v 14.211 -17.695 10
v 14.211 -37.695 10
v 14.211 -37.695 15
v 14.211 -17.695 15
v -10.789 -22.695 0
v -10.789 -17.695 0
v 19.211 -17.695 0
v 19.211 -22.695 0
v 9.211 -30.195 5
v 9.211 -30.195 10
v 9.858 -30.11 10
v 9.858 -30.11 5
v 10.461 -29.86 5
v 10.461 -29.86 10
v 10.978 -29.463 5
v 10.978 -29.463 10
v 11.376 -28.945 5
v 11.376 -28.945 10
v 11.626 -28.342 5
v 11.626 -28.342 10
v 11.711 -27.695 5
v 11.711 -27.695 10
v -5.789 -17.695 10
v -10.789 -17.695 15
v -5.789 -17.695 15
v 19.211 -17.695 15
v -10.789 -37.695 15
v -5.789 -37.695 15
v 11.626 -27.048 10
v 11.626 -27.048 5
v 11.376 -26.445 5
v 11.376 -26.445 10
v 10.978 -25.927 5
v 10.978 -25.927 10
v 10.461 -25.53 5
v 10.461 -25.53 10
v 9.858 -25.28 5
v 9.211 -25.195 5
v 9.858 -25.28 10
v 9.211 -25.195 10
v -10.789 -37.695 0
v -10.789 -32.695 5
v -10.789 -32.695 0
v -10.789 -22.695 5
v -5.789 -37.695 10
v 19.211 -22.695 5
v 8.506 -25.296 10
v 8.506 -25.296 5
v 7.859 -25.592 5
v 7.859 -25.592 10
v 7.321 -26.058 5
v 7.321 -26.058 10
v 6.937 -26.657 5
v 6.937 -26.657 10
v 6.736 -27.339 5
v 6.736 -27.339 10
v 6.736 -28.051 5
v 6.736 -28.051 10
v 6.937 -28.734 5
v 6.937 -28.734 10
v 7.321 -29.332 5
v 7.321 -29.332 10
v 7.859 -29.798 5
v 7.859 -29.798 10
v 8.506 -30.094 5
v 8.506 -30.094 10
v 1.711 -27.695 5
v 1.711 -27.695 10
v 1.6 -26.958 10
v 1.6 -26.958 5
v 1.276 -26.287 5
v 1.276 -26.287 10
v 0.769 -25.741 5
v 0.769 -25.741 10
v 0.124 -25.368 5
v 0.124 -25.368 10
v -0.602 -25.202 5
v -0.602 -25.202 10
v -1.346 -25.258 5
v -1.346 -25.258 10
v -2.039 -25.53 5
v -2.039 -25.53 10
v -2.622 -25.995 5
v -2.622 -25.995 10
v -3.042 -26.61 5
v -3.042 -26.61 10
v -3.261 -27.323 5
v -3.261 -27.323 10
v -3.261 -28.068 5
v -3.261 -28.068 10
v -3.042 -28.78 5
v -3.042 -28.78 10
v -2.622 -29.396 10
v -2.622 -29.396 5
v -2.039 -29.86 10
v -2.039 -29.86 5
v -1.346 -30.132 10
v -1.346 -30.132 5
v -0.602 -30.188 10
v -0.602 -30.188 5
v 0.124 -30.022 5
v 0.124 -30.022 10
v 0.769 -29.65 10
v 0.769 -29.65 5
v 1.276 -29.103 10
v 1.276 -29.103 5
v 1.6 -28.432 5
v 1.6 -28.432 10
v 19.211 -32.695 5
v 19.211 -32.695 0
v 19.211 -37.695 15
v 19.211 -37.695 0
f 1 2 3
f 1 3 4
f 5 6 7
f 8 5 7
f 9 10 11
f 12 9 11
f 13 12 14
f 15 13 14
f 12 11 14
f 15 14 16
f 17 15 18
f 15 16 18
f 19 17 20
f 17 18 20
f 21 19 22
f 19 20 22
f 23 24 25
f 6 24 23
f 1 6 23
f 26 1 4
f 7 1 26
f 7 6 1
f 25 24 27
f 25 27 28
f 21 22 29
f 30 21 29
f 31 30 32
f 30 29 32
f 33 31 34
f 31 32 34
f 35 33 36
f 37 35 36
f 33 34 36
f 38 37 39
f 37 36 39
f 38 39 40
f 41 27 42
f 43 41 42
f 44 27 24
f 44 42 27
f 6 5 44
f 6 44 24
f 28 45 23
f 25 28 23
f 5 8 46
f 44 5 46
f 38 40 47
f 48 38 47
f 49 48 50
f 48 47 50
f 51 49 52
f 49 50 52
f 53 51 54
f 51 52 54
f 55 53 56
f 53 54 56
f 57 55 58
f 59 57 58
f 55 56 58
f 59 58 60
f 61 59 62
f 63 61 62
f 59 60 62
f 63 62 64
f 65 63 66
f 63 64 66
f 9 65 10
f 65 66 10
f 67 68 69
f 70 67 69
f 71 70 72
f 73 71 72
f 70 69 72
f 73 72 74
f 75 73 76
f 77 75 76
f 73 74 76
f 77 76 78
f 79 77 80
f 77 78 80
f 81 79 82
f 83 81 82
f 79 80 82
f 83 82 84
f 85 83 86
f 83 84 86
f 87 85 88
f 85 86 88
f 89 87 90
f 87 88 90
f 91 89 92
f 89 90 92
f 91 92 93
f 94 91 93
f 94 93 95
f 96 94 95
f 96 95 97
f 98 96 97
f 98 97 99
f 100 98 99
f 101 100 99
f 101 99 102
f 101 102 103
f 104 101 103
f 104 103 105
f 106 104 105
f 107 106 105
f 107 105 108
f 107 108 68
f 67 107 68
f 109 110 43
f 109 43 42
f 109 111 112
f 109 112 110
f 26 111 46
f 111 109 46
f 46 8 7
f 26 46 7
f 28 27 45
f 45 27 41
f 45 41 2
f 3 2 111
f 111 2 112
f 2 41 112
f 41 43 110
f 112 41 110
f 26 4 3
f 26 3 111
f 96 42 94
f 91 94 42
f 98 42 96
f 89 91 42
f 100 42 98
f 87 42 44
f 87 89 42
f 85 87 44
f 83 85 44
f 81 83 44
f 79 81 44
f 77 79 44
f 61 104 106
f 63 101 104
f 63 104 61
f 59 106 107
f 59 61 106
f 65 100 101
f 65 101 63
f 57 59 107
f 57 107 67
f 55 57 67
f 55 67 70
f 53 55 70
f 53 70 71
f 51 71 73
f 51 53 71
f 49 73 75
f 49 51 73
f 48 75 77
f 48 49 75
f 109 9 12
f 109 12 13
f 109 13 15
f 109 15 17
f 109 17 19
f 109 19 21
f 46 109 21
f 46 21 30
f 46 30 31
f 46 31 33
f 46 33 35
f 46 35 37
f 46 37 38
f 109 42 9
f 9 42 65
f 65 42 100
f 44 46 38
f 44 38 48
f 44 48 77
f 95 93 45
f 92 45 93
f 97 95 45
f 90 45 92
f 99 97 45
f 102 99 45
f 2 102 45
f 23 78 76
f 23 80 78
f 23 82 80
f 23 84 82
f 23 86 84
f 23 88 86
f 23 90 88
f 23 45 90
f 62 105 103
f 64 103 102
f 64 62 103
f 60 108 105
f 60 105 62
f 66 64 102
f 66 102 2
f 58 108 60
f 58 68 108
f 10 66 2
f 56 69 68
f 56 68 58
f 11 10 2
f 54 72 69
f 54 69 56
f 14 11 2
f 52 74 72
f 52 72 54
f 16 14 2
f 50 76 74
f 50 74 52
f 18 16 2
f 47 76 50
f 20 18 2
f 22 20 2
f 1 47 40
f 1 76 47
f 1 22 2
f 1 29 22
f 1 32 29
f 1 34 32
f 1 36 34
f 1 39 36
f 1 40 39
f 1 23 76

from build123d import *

# Parameters (mm, degrees)
F0_W     = 30
F0_H     = 20
F1_DEPTH = 10
F2_W     = 5
F2_H     = 20
F3_DEPTH = 5
F4_R     = 2.5
F5_DEPTH = 10.001
F7_DEPTH = 10.001
F8_W     = 10
F8_H     = 5
F9_DEPTH = 30.001


with BuildPart() as f1:
    # F0 (on Top) → F1 (new body)
    with BuildSketch(Plane.XY):
        with Locations((4.2107195362, -27.6951151714)):
            Rectangle(F0_W, F0_H)
    extrude(amount=F1_DEPTH)

    # F2 (on face) → F3 (join)
    with BuildSketch(Plane.XY.offset(10)):
        with Locations((-8.2892804638, -27.6951151714)):
            Rectangle(F2_W, F2_H)
        with Locations((16.7107195362, -27.6951151714)):
            Rectangle(F2_W, F2_H)
    extrude(amount=F3_DEPTH)

    # F4 (on face) → F5 (cut, through all)
    with BuildSketch(Plane.XY.offset(10)):
        with Locations((-0.7892804638, -27.6951151714)):
            Circle(F4_R)
    extrude(amount=-F5_DEPTH, mode=Mode.SUBTRACT)

    # F6 (on face) → F7 (cut, through all)
    with BuildSketch(Plane.XY.offset(10)):
        with BuildLine():
            ThreePointArc((9.2107195362, -25.1951151714), (6.7107195362, -27.6951151714), (9.2107195362, -30.1951151714))
            Line((9.2107195362, -30.1951151714), (9.2107195362, -25.1951151714))
        make_face()
        with BuildLine():
            Line((9.2107195362, -25.1951151714), (9.2107195362, -30.1951151714))
            ThreePointArc((9.2107195362, -30.1951151714), (10.9784864892, -29.4628821243), (11.7107195362, -27.6951151714))
            ThreePointArc((11.7107195362, -27.6951151714), (10.9784864892, -25.9273482184), (9.2107195362, -25.1951151714))
        make_face()
    extrude(amount=-F7_DEPTH, mode=Mode.SUBTRACT)

    # F8 (on face) → F9 (cut, through all)
    with BuildSketch(Plane.YZ.offset(19.2107195362)):
        with Locations((-27.6951151714, 2.5)):
            Rectangle(F8_W, F8_H)
    extrude(amount=-F9_DEPTH, mode=Mode.SUBTRACT)


solid = f1.part
